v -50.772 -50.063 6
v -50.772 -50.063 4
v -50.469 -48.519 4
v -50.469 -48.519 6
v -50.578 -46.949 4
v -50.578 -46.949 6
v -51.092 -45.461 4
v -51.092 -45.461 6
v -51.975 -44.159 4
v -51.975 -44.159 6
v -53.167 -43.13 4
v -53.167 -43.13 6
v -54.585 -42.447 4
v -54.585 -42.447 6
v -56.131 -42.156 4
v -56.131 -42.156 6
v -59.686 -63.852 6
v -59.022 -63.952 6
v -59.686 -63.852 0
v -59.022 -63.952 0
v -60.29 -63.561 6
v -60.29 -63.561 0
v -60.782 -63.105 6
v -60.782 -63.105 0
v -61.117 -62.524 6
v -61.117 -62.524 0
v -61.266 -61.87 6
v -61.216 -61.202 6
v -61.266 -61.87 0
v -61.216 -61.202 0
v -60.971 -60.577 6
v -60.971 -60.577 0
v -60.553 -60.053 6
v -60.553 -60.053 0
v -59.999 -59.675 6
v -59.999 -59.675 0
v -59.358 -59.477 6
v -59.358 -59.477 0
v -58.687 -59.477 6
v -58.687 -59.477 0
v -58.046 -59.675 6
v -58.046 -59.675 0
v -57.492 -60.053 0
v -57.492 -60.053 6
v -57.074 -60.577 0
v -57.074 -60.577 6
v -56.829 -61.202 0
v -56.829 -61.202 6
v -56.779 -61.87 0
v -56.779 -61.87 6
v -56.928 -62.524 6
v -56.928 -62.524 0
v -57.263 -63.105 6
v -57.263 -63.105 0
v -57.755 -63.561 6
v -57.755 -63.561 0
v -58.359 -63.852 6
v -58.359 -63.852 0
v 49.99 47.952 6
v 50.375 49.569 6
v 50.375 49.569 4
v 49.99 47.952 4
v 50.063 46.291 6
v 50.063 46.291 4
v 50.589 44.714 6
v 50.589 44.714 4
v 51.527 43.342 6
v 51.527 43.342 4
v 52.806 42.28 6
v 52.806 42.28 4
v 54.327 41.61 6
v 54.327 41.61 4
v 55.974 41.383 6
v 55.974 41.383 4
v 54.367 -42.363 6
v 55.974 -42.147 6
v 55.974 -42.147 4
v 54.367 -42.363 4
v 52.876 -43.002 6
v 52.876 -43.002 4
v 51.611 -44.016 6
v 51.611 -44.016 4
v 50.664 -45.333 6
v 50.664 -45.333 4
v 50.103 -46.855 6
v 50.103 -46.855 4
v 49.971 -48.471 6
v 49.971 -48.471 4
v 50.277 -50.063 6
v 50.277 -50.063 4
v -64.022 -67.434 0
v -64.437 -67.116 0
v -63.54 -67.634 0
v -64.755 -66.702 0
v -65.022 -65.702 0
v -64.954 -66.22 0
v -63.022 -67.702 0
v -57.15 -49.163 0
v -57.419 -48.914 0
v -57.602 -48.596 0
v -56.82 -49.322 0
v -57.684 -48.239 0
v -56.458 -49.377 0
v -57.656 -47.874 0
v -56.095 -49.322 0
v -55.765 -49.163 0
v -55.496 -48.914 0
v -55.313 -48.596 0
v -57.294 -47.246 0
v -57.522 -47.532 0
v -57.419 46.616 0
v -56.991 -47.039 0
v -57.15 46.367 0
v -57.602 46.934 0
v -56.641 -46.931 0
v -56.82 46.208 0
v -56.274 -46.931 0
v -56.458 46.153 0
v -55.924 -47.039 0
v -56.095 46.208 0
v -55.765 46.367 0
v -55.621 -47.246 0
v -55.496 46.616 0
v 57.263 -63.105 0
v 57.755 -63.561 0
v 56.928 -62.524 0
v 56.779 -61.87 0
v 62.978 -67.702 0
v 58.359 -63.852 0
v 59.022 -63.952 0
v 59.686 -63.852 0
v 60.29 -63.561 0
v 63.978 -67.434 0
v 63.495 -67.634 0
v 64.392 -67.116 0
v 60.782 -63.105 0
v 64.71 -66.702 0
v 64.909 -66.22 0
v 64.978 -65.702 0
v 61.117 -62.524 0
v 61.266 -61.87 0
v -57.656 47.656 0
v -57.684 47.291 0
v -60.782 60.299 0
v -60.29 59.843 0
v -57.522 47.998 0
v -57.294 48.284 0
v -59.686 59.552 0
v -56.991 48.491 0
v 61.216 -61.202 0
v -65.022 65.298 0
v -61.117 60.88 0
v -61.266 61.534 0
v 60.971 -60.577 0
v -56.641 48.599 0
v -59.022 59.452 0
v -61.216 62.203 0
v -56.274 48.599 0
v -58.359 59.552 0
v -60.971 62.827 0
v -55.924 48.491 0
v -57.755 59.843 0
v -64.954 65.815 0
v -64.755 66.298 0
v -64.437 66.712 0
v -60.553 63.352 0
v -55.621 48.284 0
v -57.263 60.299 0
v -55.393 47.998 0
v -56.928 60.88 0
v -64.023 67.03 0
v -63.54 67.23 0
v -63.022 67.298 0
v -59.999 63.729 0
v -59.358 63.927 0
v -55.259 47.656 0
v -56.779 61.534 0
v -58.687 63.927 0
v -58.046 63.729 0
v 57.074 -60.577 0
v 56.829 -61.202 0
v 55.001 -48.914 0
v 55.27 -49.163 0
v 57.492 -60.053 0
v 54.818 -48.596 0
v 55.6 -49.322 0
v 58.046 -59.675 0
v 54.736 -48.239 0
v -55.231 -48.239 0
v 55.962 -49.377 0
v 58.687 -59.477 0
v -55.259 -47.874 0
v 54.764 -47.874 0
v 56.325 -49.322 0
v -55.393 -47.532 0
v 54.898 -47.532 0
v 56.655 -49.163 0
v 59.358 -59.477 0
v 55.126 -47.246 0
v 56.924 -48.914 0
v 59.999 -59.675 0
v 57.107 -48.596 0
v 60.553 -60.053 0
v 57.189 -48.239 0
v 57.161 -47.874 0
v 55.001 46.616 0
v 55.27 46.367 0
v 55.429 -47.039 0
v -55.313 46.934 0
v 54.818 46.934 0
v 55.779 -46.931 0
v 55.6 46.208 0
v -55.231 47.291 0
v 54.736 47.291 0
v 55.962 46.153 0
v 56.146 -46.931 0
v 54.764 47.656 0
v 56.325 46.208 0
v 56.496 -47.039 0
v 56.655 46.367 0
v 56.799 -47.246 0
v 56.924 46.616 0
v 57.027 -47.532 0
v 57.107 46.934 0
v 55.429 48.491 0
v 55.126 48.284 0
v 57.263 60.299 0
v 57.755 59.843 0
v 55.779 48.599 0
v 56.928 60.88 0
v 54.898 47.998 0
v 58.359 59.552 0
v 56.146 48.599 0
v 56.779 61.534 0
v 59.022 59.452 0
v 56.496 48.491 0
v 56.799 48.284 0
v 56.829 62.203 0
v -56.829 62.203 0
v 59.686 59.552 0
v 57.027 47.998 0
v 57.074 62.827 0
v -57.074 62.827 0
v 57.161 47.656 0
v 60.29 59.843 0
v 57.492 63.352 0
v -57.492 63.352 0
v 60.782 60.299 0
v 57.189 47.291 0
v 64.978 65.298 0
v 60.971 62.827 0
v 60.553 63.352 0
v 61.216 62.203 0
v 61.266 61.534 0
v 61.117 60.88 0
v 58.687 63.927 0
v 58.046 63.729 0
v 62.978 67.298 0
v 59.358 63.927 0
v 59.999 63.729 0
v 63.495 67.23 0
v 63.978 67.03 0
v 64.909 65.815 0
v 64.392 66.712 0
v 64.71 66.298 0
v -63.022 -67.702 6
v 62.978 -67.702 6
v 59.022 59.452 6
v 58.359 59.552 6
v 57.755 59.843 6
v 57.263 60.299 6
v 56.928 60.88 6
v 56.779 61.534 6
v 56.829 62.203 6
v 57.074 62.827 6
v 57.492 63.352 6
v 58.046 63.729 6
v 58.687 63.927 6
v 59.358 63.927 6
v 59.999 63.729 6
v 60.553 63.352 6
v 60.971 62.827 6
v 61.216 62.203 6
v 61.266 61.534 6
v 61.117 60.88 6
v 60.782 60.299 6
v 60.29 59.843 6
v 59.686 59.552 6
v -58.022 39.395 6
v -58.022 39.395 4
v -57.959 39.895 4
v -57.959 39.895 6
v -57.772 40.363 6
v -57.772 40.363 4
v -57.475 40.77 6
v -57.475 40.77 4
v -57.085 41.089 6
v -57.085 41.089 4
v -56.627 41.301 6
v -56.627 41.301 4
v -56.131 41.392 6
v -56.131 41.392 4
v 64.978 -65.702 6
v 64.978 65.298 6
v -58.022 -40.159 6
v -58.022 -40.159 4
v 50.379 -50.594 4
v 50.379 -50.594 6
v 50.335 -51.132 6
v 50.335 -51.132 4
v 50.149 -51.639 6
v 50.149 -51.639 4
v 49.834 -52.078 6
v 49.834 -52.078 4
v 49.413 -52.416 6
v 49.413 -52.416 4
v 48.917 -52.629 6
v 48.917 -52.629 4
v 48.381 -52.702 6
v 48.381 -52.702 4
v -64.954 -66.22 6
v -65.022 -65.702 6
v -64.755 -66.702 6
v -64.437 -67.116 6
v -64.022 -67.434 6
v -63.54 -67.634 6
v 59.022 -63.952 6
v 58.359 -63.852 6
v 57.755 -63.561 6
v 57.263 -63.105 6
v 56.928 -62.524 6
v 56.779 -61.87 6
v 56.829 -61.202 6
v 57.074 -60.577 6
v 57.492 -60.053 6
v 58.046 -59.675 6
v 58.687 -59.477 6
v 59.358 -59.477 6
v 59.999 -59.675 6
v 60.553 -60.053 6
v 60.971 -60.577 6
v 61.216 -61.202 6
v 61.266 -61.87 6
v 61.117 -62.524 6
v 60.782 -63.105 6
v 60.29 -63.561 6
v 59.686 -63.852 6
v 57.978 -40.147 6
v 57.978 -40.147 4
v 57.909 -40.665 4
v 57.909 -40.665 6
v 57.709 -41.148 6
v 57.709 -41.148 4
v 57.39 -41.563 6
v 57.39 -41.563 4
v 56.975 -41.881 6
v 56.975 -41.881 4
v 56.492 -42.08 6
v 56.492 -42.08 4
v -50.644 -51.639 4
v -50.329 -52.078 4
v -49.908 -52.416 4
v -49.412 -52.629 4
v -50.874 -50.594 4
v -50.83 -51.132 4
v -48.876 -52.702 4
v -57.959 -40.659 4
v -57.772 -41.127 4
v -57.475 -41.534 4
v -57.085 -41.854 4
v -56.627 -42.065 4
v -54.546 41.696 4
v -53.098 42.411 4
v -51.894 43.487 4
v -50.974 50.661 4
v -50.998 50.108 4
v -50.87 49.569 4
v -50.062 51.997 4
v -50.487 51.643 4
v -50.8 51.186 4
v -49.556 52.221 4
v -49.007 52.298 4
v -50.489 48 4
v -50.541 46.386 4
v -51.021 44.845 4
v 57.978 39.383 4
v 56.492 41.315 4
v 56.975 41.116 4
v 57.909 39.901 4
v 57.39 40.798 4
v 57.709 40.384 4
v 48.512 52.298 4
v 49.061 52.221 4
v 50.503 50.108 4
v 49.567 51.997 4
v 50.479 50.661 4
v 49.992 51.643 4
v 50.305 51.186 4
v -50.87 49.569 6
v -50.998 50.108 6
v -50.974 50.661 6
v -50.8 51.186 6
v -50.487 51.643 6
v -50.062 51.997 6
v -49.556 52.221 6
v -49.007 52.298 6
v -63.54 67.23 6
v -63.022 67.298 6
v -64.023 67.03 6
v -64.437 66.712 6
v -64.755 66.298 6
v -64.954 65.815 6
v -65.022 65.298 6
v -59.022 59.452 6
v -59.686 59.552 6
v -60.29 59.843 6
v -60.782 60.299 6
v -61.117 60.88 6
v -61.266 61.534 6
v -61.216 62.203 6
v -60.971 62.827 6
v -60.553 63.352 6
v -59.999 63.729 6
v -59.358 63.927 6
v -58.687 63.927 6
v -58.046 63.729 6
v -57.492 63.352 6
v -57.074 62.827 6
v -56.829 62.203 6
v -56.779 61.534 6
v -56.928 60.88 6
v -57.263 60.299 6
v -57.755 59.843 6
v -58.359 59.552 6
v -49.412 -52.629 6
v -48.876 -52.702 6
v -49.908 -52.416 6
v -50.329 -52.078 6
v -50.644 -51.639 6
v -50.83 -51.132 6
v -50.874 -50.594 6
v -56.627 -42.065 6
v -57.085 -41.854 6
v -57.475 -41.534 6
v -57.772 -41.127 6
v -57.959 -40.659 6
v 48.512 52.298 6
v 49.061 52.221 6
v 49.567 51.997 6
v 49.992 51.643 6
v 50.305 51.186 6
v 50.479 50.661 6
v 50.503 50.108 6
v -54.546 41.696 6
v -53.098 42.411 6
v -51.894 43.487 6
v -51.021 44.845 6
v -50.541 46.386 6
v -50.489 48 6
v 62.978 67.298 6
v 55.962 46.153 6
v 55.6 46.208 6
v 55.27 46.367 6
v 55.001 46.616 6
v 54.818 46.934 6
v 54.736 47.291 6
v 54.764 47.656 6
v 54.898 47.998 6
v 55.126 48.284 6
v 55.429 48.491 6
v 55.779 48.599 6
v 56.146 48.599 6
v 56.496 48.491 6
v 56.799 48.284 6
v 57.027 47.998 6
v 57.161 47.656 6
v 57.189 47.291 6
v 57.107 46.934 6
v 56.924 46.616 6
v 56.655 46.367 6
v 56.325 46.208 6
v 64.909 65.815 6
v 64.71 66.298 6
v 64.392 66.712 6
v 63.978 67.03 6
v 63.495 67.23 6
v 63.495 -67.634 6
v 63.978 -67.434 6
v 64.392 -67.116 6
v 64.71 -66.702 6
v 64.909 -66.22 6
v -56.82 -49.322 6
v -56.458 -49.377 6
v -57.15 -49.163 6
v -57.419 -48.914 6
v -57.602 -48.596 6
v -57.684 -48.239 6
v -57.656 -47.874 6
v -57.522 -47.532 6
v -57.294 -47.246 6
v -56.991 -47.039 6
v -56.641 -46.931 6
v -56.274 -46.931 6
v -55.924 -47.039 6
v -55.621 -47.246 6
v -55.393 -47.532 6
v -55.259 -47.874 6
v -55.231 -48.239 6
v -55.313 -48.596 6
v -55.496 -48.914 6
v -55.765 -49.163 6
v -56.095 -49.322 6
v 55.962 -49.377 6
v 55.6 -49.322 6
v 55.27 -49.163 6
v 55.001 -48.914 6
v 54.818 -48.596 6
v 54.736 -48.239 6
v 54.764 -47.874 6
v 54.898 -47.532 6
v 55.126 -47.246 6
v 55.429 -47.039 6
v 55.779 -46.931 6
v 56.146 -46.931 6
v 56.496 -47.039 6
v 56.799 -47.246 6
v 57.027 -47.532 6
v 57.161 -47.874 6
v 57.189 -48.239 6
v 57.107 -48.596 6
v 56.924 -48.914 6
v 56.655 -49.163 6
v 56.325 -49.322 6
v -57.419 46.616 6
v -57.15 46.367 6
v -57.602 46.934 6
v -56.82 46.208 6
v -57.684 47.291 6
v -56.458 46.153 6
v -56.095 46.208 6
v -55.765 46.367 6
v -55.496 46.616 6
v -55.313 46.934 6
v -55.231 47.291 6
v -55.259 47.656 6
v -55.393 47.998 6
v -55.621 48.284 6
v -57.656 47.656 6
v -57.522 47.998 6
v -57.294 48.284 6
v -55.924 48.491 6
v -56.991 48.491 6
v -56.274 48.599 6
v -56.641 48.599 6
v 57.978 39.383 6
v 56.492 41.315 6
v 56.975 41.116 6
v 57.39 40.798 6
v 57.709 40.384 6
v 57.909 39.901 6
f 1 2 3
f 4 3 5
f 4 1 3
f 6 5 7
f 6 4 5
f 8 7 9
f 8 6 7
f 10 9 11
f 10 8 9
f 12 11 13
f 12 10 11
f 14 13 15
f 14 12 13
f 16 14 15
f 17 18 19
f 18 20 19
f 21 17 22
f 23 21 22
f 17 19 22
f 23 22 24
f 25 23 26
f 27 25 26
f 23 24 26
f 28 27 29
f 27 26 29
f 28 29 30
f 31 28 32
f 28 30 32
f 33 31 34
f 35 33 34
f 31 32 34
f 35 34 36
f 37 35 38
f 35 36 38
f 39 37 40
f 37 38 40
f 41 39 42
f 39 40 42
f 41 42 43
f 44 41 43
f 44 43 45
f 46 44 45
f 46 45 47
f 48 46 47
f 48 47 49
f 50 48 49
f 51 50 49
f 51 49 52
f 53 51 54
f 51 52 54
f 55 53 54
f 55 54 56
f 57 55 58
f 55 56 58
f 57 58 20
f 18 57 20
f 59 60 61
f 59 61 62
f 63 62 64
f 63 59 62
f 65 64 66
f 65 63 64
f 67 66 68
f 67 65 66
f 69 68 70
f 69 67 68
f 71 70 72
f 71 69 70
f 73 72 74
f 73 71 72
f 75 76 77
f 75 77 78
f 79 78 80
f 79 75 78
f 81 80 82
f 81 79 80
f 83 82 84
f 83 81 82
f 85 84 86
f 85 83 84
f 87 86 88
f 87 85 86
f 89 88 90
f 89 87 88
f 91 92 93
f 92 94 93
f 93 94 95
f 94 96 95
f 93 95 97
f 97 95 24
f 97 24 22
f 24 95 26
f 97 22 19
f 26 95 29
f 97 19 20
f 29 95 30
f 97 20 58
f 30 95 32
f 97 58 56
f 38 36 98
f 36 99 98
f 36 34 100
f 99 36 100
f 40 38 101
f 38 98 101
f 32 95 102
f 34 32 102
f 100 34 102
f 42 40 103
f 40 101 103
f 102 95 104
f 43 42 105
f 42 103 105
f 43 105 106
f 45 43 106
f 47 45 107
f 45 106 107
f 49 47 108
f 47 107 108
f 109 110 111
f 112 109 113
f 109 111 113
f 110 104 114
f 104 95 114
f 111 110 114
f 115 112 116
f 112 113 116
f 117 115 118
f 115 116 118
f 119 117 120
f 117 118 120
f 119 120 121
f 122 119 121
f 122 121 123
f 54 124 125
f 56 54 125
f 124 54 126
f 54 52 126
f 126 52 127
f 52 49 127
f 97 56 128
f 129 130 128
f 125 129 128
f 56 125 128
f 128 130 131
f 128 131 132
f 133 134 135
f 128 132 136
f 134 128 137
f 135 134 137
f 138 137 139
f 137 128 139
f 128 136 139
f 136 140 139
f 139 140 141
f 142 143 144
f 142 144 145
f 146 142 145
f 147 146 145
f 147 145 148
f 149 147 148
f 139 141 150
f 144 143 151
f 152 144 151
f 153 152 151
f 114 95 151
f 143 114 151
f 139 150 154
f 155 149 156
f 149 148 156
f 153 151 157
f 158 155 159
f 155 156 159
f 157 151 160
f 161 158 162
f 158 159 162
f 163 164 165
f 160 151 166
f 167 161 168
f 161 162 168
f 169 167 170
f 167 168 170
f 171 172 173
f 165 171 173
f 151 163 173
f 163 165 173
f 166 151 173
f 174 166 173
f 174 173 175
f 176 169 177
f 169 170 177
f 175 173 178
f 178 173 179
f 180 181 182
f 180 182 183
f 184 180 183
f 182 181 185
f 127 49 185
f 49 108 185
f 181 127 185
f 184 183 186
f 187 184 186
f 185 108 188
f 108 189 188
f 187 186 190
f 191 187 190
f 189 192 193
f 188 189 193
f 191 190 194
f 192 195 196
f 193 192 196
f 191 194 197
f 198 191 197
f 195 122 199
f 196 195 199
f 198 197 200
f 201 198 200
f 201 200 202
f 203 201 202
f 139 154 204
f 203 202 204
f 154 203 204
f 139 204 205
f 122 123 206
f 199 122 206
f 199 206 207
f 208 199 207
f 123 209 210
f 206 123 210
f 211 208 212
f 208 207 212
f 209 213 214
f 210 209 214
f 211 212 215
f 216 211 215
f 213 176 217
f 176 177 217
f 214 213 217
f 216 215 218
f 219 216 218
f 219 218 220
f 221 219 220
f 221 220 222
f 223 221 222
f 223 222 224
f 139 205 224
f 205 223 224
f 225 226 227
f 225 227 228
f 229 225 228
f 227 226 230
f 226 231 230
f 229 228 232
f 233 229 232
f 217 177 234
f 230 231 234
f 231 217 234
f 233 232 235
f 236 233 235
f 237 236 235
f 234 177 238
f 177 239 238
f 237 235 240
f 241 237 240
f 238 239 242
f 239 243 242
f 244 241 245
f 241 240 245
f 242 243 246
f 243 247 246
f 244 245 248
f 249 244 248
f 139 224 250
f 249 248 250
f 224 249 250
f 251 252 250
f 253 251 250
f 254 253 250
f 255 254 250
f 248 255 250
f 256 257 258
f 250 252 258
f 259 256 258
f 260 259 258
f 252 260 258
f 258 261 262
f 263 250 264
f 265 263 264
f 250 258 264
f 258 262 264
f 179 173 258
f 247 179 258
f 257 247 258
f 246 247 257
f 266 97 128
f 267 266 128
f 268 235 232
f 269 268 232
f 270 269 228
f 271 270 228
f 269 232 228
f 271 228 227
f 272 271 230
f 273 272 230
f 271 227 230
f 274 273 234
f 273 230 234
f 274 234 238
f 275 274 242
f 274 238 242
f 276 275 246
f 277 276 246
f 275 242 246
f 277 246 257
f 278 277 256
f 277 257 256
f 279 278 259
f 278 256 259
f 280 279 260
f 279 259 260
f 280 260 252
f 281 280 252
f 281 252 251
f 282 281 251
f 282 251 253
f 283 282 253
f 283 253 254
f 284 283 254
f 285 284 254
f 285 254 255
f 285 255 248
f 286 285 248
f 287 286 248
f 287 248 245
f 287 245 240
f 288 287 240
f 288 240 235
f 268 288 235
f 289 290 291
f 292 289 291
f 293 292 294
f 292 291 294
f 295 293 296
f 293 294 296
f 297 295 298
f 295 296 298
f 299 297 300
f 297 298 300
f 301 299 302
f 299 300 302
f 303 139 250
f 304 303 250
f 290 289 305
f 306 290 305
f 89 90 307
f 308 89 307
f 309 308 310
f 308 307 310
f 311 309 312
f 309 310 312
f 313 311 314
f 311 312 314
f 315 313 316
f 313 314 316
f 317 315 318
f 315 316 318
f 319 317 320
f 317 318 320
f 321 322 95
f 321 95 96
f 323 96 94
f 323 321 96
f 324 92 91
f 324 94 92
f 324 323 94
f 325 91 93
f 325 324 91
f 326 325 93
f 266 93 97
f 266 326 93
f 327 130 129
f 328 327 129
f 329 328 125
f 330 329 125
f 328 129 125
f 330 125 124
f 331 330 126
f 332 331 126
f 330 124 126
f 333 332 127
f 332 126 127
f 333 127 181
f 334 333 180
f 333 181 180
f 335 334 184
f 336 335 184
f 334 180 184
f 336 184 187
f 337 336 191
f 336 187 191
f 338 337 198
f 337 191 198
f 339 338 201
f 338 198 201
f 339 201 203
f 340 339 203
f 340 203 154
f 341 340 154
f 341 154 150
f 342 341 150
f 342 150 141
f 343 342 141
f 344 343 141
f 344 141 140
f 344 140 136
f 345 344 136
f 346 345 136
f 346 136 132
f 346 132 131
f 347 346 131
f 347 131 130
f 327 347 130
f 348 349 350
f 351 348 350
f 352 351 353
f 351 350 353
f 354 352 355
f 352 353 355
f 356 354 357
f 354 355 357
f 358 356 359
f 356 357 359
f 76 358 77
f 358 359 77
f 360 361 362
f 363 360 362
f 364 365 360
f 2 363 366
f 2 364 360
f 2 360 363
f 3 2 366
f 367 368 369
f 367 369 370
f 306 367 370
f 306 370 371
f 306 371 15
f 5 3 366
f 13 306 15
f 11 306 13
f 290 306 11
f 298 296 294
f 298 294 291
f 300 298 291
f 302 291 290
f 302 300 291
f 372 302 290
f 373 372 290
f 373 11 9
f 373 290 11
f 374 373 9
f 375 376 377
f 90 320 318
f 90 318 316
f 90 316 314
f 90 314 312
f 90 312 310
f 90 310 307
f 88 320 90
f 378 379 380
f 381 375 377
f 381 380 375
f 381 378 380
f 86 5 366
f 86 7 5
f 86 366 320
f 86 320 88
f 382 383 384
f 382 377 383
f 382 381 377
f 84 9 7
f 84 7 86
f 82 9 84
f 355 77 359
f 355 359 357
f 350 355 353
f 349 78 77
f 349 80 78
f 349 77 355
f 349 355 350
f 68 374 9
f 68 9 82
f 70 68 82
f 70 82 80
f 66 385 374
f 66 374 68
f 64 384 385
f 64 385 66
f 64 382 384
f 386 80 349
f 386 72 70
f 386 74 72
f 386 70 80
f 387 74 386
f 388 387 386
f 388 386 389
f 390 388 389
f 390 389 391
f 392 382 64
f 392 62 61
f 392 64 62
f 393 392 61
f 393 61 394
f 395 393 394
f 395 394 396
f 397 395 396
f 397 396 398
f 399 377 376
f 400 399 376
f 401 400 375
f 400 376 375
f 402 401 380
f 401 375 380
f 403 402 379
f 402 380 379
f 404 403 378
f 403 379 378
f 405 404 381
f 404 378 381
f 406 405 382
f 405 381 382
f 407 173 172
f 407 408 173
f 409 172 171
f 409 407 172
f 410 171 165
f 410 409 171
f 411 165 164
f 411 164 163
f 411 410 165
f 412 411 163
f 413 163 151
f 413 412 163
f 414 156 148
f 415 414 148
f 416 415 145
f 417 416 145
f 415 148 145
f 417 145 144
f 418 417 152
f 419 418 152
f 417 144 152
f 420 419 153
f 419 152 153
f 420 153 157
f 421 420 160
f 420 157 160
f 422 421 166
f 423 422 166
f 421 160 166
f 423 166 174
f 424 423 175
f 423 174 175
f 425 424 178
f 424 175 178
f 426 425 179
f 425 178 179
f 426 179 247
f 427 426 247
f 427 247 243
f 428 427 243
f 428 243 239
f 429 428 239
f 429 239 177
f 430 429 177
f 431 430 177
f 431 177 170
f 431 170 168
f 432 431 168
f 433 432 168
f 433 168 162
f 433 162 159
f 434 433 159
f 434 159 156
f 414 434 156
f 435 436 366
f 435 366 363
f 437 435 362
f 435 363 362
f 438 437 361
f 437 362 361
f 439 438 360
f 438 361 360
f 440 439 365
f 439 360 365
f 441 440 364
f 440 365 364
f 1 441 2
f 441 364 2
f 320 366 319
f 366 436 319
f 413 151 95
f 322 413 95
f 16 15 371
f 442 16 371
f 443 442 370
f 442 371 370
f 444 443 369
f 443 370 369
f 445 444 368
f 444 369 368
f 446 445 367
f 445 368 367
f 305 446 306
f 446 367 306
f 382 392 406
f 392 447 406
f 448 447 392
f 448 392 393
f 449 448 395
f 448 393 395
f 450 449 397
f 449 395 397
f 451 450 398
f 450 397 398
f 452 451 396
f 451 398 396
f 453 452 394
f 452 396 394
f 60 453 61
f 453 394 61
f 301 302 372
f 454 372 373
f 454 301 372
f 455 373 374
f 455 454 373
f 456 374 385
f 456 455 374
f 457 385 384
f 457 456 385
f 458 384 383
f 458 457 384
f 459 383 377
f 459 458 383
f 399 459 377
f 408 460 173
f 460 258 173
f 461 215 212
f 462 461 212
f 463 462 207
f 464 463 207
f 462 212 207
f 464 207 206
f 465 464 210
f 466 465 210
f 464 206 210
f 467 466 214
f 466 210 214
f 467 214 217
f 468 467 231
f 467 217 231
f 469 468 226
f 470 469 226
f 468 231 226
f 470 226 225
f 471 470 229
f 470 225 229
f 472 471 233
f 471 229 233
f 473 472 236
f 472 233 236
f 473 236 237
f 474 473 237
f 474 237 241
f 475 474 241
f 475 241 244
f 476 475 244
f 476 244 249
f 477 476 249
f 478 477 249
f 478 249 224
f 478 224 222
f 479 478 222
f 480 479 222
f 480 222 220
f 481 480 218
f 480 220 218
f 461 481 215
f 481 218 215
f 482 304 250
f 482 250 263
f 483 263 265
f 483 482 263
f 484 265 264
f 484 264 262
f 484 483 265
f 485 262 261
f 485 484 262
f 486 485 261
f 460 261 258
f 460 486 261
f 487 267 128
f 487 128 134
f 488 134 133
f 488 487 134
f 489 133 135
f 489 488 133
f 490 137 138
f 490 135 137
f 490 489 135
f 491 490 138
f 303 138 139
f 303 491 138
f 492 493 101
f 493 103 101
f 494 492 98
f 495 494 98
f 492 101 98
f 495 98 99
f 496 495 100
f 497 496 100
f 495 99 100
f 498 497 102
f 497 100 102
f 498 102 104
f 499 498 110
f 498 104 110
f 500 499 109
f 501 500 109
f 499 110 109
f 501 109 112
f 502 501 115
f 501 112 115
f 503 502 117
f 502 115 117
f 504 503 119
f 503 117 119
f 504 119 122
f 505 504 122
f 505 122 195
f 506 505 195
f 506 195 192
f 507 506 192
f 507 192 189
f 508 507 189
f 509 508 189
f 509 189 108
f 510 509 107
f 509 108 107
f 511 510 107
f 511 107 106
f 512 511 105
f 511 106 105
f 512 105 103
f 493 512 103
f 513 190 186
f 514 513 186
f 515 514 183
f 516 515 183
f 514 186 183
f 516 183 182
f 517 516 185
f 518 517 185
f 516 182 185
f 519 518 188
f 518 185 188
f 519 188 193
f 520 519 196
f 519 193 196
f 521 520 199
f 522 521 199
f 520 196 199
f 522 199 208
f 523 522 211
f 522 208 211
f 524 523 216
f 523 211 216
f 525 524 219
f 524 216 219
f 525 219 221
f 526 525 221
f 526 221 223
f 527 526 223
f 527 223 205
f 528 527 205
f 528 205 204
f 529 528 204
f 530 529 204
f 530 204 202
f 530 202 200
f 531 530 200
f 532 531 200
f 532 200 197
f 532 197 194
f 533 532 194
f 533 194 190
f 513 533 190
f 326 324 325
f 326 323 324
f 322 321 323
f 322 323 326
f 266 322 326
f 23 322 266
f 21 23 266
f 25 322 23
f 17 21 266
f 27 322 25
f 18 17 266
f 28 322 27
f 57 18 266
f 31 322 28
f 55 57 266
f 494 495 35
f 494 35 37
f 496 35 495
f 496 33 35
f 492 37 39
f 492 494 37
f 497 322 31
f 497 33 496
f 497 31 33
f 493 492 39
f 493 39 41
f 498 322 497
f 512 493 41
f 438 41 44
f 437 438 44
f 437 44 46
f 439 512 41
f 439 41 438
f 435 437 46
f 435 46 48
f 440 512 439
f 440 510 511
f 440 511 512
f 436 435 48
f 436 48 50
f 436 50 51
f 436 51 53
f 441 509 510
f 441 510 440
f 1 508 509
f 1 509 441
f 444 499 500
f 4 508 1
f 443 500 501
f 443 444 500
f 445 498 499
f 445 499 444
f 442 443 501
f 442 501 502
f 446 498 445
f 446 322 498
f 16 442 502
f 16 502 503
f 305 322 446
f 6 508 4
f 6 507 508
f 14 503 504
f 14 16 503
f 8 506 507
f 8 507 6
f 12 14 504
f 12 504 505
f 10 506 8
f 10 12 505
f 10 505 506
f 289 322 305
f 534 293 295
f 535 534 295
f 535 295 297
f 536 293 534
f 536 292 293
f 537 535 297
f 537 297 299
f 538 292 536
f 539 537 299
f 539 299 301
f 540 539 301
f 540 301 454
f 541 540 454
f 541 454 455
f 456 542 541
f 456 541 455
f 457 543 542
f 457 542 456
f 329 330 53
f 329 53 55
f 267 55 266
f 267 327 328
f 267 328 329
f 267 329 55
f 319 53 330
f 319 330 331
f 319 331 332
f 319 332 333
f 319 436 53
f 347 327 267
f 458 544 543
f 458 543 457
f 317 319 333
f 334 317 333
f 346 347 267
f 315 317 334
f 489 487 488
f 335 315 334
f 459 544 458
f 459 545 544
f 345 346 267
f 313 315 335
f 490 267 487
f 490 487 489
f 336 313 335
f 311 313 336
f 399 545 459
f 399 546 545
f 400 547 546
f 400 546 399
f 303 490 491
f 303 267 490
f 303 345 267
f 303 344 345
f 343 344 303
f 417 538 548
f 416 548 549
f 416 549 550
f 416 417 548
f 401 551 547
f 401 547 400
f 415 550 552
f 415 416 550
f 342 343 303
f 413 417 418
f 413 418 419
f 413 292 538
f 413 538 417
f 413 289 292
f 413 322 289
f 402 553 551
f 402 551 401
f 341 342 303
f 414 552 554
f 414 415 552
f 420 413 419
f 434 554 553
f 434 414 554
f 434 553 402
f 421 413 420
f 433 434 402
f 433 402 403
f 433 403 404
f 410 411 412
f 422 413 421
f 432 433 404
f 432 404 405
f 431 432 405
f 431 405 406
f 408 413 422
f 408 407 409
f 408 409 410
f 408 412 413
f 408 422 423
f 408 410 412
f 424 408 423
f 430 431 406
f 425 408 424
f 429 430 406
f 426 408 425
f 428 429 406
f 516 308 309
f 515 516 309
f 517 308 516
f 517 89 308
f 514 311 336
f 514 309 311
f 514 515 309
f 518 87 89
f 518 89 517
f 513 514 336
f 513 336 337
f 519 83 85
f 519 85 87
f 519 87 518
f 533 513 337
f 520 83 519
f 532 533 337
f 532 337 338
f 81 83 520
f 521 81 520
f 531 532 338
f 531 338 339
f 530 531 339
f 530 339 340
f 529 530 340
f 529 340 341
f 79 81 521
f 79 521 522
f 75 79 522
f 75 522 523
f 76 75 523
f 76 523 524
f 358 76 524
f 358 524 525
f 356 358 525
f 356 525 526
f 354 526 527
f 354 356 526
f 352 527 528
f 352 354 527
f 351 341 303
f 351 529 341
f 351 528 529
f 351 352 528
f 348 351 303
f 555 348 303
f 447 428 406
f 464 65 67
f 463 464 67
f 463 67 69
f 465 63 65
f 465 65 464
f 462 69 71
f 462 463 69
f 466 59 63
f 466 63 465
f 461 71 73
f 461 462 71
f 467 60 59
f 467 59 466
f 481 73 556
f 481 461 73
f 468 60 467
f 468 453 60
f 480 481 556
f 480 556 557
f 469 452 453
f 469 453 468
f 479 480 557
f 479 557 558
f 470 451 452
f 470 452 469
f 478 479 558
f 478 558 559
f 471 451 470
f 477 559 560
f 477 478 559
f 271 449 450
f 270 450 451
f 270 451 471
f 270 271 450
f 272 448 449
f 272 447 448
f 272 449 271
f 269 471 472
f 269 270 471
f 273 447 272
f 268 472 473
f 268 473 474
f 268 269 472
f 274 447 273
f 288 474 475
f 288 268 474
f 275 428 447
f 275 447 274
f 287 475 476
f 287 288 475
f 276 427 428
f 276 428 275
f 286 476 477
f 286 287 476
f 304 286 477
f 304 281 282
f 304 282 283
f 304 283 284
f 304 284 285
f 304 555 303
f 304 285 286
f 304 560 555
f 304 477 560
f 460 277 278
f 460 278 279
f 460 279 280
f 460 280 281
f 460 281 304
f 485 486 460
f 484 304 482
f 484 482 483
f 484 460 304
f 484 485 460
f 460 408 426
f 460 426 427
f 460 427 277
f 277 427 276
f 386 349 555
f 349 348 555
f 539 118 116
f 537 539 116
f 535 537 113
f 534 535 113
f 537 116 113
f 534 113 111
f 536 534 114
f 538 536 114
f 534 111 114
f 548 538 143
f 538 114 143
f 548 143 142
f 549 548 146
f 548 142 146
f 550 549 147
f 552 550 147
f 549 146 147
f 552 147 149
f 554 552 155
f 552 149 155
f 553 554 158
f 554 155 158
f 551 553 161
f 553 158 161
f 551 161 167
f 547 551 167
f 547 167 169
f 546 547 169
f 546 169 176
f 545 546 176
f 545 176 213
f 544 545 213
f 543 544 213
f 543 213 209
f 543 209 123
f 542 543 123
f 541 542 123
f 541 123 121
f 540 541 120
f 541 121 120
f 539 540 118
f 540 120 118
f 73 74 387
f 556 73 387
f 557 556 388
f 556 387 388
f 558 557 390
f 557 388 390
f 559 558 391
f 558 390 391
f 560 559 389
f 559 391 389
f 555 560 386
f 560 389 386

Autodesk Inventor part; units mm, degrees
ref_plane "YZ Plane" through (0, 0, 0) normal (1, 0, 0) x (0, 1, 0)
ref_plane "XZ Plane" through (0, 0, 0) normal (0, 1, 0) x (-1, 0, 0)
ref_plane "XY Plane" through (0, 0, 0) normal (0, 0, 1) x (1, 0, 0)
sketch "Esboço1" plane through (0, 0, 0) normal (0, 0, 1) x (1, 0, 0)
  line L0 (60.7325, -52.1672) -> (60.7325, 51.7628)
  line L1 (-60.7775, 51.7628) -> (-60.7775, -52.1672)
  line L2 (60.7325, -0.2022) -> (-60.7775, -0.2022)
  line L3 (64.9775, 67.2978) -> (-65.0225, 67.2978)
  line L4 (-65.0225, 67.2978) -> (-65.0225, -67.7022)
  line L5 (-65.0225, -67.7022) -> (64.9775, -67.7022)
  line L6 (64.9775, -67.7022) -> (64.9775, 67.2978)
  line L7 (64.9775, 67.2978) -> (-65.0225, -67.7022) construction
  line L8 (-65.0225, 67.2978) -> (64.9775, -67.7022) construction
  circle A0 centre (55.9625, -48.1472) radius 1.8
  circle A1 centre (55.9625, 47.3828) radius 1.8
  circle A2 centre (-56.4575, 47.3828) radius 1.8
  circle A3 centre (-56.4575, -48.1472) radius 1.8
  circle A4 centre (-56.4575, 47.3828) radius 0.7501
  circle A5 centre (-56.4575, -48.1472) radius 1.059
  circle A6 centre (55.9625, -48.1472) radius 0.7793
  circle A7 centre (55.9625, 47.3828) radius 0.9848
  point P0 (0, 0)
  point P1 (-0.0225, -0.2022)
  dimension "d0" = 135
  dimension "d1" = 130
extrude "Extrusão1" add sketch "Esboço1" along normal blind 6 contours L6 L5 L4 L3 | A0 | A1 | A2 | A3
sketch "Esboço2" plane through (0, 0, 6) normal (0, 0, 1) x (1, 0, 0)
  circle A0 centre (-56.4575, 47.3828) radius 0.7501 projected
  circle A1 centre (55.9625, 47.3828) radius 0.9848 projected
  circle A2 centre (55.9625, -48.1472) radius 0.7793 projected
  circle A3 centre (-56.4575, -48.1472) radius 1.059 projected
  point P0 (0, 0)
hole "Furo1" at (-56.4575, 47.3828, 6) at (55.9625, 47.3828, 6) at (55.9625, -48.1472, 6) at (-56.4575, -48.1472, 6) direction (0, 0, -1) diameter 2.459 end through all thread size "M3x0.5" class "6H" standard "ISO Metric profile"
sketch "Esboço3" plane through (0, 0, 6) normal (0, 0, 1) x (1, 0, 0)
  line L0 (64.9775, 67.2978) -> (-65.0225, 67.2978) projected
  line L1 (-0.0225, 67.2978) -> (-0.0225, -67.7022)
  line L2 (-65.0225, -67.7022) -> (64.9775, -67.7022) projected
  line L3 (-58.0225, -52.7022) -> (57.9775, -52.7022)
  line L4 (57.9775, -52.7022) -> (57.9775, 52.2978)
  line L5 (57.9775, 52.2978) -> (-58.0225, 52.2978)
  line L6 (-58.0225, 52.2978) -> (-58.0225, -52.7022)
  line L7 (-58.0225, -52.7022) -> (57.9775, 52.2978) construction
  line L8 (57.9775, -52.7022) -> (-58.0225, 52.2978) construction
  circle A0 centre (-56.4575, 47.3828) radius 1.2295 projected
  circle A1 centre (-56.4575, 47.3828) radius 6
  circle A2 centre (55.9625, 47.3828) radius 1.2295 projected
  circle A3 centre (55.9625, 47.3828) radius 6
  circle A4 centre (-56.4575, -48.1472) radius 1.2295 projected
  circle A5 centre (-56.4575, -48.1472) radius 6
  circle A6 centre (55.9625, -48.1472) radius 1.2295 projected
  circle A7 centre (55.9625, -48.1472) radius 6
  point P0 (-0.0225, -0.2022)
  point P1 (-58.0225, -42.3549)
  point P2 (-52.5521, -52.7022)
  point P3 (52.0572, -52.7022)
  point P4 (57.9775, -42.4957)
  point P5 (57.9775, 41.7313)
  point P6 (52.5212, 52.2978)
  point P7 (-53.0161, 52.2978)
  point P8 (-58.0225, 41.5905)
  dimension "d16" = 116
  dimension "d17" = 105
  dimension "d18" = 12
extrude "Extrusão2" cut sketch "Esboço3" against normal blind 2 contours L5 A3 L4 A7 L3 L1 | L1 L3 A5 L6 A1 L5
fillet "Arredondamento1" radius 2 8 edges at (-58.0225, -42.3549, 5) (-52.5521, -52.7022, 5) (52.0572, -52.7022, 5) (57.9775, -42.4957, 5) (57.9775, 41.7313, 5) (52.5212, 52.2978, 5) (-53.0161, 52.2978, 5) (-58.0225, 41.5905, 5)
sketch "Esboço4" plane through (0, 0, 6) normal (0, 0, 1) x (1, 0, 0)
  line L0 (0, 0) -> (0, -87.1961)
  line L1 (0, 0) -> (-82.4398, 0)
  line L2 (-65.0225, -67.7022) -> (64.9775, -67.7022) projected
  line L3 (-65.0225, 67.2978) -> (-65.0225, -67.7022) projected
  line L4 (-65.0225, 67.7022) -> (64.9775, 67.7022)
  point P0 (-59.0225, -61.7022)
  point P1 (59.0225, -61.7022)
  point P2 (65.0225, -67.7022)
  point P3 (-59.0225, 61.7022)
  point P4 (65.0225, 67.7022)
  point P5 (59.0225, 61.7022)
  dimension "d22" = 6
  dimension "d23" = 6
hole "Furo2" at (-59.0225, -61.7022, 6) at (59.0225, -61.7022, 6) at (59.0225, 61.7022, 6) at (-59.0225, 61.7022, 6) direction (0, 0, -1) diameter 4.5 end through all
fillet "Arredondamento2" radius 2 4 edges at (64.9775, -67.7022, 3) (-65.0225, -67.7022, 3) (-65.0225, 67.2978, 3) (64.9775, 67.2978, 3)
properties part number "chapa da pcb"
